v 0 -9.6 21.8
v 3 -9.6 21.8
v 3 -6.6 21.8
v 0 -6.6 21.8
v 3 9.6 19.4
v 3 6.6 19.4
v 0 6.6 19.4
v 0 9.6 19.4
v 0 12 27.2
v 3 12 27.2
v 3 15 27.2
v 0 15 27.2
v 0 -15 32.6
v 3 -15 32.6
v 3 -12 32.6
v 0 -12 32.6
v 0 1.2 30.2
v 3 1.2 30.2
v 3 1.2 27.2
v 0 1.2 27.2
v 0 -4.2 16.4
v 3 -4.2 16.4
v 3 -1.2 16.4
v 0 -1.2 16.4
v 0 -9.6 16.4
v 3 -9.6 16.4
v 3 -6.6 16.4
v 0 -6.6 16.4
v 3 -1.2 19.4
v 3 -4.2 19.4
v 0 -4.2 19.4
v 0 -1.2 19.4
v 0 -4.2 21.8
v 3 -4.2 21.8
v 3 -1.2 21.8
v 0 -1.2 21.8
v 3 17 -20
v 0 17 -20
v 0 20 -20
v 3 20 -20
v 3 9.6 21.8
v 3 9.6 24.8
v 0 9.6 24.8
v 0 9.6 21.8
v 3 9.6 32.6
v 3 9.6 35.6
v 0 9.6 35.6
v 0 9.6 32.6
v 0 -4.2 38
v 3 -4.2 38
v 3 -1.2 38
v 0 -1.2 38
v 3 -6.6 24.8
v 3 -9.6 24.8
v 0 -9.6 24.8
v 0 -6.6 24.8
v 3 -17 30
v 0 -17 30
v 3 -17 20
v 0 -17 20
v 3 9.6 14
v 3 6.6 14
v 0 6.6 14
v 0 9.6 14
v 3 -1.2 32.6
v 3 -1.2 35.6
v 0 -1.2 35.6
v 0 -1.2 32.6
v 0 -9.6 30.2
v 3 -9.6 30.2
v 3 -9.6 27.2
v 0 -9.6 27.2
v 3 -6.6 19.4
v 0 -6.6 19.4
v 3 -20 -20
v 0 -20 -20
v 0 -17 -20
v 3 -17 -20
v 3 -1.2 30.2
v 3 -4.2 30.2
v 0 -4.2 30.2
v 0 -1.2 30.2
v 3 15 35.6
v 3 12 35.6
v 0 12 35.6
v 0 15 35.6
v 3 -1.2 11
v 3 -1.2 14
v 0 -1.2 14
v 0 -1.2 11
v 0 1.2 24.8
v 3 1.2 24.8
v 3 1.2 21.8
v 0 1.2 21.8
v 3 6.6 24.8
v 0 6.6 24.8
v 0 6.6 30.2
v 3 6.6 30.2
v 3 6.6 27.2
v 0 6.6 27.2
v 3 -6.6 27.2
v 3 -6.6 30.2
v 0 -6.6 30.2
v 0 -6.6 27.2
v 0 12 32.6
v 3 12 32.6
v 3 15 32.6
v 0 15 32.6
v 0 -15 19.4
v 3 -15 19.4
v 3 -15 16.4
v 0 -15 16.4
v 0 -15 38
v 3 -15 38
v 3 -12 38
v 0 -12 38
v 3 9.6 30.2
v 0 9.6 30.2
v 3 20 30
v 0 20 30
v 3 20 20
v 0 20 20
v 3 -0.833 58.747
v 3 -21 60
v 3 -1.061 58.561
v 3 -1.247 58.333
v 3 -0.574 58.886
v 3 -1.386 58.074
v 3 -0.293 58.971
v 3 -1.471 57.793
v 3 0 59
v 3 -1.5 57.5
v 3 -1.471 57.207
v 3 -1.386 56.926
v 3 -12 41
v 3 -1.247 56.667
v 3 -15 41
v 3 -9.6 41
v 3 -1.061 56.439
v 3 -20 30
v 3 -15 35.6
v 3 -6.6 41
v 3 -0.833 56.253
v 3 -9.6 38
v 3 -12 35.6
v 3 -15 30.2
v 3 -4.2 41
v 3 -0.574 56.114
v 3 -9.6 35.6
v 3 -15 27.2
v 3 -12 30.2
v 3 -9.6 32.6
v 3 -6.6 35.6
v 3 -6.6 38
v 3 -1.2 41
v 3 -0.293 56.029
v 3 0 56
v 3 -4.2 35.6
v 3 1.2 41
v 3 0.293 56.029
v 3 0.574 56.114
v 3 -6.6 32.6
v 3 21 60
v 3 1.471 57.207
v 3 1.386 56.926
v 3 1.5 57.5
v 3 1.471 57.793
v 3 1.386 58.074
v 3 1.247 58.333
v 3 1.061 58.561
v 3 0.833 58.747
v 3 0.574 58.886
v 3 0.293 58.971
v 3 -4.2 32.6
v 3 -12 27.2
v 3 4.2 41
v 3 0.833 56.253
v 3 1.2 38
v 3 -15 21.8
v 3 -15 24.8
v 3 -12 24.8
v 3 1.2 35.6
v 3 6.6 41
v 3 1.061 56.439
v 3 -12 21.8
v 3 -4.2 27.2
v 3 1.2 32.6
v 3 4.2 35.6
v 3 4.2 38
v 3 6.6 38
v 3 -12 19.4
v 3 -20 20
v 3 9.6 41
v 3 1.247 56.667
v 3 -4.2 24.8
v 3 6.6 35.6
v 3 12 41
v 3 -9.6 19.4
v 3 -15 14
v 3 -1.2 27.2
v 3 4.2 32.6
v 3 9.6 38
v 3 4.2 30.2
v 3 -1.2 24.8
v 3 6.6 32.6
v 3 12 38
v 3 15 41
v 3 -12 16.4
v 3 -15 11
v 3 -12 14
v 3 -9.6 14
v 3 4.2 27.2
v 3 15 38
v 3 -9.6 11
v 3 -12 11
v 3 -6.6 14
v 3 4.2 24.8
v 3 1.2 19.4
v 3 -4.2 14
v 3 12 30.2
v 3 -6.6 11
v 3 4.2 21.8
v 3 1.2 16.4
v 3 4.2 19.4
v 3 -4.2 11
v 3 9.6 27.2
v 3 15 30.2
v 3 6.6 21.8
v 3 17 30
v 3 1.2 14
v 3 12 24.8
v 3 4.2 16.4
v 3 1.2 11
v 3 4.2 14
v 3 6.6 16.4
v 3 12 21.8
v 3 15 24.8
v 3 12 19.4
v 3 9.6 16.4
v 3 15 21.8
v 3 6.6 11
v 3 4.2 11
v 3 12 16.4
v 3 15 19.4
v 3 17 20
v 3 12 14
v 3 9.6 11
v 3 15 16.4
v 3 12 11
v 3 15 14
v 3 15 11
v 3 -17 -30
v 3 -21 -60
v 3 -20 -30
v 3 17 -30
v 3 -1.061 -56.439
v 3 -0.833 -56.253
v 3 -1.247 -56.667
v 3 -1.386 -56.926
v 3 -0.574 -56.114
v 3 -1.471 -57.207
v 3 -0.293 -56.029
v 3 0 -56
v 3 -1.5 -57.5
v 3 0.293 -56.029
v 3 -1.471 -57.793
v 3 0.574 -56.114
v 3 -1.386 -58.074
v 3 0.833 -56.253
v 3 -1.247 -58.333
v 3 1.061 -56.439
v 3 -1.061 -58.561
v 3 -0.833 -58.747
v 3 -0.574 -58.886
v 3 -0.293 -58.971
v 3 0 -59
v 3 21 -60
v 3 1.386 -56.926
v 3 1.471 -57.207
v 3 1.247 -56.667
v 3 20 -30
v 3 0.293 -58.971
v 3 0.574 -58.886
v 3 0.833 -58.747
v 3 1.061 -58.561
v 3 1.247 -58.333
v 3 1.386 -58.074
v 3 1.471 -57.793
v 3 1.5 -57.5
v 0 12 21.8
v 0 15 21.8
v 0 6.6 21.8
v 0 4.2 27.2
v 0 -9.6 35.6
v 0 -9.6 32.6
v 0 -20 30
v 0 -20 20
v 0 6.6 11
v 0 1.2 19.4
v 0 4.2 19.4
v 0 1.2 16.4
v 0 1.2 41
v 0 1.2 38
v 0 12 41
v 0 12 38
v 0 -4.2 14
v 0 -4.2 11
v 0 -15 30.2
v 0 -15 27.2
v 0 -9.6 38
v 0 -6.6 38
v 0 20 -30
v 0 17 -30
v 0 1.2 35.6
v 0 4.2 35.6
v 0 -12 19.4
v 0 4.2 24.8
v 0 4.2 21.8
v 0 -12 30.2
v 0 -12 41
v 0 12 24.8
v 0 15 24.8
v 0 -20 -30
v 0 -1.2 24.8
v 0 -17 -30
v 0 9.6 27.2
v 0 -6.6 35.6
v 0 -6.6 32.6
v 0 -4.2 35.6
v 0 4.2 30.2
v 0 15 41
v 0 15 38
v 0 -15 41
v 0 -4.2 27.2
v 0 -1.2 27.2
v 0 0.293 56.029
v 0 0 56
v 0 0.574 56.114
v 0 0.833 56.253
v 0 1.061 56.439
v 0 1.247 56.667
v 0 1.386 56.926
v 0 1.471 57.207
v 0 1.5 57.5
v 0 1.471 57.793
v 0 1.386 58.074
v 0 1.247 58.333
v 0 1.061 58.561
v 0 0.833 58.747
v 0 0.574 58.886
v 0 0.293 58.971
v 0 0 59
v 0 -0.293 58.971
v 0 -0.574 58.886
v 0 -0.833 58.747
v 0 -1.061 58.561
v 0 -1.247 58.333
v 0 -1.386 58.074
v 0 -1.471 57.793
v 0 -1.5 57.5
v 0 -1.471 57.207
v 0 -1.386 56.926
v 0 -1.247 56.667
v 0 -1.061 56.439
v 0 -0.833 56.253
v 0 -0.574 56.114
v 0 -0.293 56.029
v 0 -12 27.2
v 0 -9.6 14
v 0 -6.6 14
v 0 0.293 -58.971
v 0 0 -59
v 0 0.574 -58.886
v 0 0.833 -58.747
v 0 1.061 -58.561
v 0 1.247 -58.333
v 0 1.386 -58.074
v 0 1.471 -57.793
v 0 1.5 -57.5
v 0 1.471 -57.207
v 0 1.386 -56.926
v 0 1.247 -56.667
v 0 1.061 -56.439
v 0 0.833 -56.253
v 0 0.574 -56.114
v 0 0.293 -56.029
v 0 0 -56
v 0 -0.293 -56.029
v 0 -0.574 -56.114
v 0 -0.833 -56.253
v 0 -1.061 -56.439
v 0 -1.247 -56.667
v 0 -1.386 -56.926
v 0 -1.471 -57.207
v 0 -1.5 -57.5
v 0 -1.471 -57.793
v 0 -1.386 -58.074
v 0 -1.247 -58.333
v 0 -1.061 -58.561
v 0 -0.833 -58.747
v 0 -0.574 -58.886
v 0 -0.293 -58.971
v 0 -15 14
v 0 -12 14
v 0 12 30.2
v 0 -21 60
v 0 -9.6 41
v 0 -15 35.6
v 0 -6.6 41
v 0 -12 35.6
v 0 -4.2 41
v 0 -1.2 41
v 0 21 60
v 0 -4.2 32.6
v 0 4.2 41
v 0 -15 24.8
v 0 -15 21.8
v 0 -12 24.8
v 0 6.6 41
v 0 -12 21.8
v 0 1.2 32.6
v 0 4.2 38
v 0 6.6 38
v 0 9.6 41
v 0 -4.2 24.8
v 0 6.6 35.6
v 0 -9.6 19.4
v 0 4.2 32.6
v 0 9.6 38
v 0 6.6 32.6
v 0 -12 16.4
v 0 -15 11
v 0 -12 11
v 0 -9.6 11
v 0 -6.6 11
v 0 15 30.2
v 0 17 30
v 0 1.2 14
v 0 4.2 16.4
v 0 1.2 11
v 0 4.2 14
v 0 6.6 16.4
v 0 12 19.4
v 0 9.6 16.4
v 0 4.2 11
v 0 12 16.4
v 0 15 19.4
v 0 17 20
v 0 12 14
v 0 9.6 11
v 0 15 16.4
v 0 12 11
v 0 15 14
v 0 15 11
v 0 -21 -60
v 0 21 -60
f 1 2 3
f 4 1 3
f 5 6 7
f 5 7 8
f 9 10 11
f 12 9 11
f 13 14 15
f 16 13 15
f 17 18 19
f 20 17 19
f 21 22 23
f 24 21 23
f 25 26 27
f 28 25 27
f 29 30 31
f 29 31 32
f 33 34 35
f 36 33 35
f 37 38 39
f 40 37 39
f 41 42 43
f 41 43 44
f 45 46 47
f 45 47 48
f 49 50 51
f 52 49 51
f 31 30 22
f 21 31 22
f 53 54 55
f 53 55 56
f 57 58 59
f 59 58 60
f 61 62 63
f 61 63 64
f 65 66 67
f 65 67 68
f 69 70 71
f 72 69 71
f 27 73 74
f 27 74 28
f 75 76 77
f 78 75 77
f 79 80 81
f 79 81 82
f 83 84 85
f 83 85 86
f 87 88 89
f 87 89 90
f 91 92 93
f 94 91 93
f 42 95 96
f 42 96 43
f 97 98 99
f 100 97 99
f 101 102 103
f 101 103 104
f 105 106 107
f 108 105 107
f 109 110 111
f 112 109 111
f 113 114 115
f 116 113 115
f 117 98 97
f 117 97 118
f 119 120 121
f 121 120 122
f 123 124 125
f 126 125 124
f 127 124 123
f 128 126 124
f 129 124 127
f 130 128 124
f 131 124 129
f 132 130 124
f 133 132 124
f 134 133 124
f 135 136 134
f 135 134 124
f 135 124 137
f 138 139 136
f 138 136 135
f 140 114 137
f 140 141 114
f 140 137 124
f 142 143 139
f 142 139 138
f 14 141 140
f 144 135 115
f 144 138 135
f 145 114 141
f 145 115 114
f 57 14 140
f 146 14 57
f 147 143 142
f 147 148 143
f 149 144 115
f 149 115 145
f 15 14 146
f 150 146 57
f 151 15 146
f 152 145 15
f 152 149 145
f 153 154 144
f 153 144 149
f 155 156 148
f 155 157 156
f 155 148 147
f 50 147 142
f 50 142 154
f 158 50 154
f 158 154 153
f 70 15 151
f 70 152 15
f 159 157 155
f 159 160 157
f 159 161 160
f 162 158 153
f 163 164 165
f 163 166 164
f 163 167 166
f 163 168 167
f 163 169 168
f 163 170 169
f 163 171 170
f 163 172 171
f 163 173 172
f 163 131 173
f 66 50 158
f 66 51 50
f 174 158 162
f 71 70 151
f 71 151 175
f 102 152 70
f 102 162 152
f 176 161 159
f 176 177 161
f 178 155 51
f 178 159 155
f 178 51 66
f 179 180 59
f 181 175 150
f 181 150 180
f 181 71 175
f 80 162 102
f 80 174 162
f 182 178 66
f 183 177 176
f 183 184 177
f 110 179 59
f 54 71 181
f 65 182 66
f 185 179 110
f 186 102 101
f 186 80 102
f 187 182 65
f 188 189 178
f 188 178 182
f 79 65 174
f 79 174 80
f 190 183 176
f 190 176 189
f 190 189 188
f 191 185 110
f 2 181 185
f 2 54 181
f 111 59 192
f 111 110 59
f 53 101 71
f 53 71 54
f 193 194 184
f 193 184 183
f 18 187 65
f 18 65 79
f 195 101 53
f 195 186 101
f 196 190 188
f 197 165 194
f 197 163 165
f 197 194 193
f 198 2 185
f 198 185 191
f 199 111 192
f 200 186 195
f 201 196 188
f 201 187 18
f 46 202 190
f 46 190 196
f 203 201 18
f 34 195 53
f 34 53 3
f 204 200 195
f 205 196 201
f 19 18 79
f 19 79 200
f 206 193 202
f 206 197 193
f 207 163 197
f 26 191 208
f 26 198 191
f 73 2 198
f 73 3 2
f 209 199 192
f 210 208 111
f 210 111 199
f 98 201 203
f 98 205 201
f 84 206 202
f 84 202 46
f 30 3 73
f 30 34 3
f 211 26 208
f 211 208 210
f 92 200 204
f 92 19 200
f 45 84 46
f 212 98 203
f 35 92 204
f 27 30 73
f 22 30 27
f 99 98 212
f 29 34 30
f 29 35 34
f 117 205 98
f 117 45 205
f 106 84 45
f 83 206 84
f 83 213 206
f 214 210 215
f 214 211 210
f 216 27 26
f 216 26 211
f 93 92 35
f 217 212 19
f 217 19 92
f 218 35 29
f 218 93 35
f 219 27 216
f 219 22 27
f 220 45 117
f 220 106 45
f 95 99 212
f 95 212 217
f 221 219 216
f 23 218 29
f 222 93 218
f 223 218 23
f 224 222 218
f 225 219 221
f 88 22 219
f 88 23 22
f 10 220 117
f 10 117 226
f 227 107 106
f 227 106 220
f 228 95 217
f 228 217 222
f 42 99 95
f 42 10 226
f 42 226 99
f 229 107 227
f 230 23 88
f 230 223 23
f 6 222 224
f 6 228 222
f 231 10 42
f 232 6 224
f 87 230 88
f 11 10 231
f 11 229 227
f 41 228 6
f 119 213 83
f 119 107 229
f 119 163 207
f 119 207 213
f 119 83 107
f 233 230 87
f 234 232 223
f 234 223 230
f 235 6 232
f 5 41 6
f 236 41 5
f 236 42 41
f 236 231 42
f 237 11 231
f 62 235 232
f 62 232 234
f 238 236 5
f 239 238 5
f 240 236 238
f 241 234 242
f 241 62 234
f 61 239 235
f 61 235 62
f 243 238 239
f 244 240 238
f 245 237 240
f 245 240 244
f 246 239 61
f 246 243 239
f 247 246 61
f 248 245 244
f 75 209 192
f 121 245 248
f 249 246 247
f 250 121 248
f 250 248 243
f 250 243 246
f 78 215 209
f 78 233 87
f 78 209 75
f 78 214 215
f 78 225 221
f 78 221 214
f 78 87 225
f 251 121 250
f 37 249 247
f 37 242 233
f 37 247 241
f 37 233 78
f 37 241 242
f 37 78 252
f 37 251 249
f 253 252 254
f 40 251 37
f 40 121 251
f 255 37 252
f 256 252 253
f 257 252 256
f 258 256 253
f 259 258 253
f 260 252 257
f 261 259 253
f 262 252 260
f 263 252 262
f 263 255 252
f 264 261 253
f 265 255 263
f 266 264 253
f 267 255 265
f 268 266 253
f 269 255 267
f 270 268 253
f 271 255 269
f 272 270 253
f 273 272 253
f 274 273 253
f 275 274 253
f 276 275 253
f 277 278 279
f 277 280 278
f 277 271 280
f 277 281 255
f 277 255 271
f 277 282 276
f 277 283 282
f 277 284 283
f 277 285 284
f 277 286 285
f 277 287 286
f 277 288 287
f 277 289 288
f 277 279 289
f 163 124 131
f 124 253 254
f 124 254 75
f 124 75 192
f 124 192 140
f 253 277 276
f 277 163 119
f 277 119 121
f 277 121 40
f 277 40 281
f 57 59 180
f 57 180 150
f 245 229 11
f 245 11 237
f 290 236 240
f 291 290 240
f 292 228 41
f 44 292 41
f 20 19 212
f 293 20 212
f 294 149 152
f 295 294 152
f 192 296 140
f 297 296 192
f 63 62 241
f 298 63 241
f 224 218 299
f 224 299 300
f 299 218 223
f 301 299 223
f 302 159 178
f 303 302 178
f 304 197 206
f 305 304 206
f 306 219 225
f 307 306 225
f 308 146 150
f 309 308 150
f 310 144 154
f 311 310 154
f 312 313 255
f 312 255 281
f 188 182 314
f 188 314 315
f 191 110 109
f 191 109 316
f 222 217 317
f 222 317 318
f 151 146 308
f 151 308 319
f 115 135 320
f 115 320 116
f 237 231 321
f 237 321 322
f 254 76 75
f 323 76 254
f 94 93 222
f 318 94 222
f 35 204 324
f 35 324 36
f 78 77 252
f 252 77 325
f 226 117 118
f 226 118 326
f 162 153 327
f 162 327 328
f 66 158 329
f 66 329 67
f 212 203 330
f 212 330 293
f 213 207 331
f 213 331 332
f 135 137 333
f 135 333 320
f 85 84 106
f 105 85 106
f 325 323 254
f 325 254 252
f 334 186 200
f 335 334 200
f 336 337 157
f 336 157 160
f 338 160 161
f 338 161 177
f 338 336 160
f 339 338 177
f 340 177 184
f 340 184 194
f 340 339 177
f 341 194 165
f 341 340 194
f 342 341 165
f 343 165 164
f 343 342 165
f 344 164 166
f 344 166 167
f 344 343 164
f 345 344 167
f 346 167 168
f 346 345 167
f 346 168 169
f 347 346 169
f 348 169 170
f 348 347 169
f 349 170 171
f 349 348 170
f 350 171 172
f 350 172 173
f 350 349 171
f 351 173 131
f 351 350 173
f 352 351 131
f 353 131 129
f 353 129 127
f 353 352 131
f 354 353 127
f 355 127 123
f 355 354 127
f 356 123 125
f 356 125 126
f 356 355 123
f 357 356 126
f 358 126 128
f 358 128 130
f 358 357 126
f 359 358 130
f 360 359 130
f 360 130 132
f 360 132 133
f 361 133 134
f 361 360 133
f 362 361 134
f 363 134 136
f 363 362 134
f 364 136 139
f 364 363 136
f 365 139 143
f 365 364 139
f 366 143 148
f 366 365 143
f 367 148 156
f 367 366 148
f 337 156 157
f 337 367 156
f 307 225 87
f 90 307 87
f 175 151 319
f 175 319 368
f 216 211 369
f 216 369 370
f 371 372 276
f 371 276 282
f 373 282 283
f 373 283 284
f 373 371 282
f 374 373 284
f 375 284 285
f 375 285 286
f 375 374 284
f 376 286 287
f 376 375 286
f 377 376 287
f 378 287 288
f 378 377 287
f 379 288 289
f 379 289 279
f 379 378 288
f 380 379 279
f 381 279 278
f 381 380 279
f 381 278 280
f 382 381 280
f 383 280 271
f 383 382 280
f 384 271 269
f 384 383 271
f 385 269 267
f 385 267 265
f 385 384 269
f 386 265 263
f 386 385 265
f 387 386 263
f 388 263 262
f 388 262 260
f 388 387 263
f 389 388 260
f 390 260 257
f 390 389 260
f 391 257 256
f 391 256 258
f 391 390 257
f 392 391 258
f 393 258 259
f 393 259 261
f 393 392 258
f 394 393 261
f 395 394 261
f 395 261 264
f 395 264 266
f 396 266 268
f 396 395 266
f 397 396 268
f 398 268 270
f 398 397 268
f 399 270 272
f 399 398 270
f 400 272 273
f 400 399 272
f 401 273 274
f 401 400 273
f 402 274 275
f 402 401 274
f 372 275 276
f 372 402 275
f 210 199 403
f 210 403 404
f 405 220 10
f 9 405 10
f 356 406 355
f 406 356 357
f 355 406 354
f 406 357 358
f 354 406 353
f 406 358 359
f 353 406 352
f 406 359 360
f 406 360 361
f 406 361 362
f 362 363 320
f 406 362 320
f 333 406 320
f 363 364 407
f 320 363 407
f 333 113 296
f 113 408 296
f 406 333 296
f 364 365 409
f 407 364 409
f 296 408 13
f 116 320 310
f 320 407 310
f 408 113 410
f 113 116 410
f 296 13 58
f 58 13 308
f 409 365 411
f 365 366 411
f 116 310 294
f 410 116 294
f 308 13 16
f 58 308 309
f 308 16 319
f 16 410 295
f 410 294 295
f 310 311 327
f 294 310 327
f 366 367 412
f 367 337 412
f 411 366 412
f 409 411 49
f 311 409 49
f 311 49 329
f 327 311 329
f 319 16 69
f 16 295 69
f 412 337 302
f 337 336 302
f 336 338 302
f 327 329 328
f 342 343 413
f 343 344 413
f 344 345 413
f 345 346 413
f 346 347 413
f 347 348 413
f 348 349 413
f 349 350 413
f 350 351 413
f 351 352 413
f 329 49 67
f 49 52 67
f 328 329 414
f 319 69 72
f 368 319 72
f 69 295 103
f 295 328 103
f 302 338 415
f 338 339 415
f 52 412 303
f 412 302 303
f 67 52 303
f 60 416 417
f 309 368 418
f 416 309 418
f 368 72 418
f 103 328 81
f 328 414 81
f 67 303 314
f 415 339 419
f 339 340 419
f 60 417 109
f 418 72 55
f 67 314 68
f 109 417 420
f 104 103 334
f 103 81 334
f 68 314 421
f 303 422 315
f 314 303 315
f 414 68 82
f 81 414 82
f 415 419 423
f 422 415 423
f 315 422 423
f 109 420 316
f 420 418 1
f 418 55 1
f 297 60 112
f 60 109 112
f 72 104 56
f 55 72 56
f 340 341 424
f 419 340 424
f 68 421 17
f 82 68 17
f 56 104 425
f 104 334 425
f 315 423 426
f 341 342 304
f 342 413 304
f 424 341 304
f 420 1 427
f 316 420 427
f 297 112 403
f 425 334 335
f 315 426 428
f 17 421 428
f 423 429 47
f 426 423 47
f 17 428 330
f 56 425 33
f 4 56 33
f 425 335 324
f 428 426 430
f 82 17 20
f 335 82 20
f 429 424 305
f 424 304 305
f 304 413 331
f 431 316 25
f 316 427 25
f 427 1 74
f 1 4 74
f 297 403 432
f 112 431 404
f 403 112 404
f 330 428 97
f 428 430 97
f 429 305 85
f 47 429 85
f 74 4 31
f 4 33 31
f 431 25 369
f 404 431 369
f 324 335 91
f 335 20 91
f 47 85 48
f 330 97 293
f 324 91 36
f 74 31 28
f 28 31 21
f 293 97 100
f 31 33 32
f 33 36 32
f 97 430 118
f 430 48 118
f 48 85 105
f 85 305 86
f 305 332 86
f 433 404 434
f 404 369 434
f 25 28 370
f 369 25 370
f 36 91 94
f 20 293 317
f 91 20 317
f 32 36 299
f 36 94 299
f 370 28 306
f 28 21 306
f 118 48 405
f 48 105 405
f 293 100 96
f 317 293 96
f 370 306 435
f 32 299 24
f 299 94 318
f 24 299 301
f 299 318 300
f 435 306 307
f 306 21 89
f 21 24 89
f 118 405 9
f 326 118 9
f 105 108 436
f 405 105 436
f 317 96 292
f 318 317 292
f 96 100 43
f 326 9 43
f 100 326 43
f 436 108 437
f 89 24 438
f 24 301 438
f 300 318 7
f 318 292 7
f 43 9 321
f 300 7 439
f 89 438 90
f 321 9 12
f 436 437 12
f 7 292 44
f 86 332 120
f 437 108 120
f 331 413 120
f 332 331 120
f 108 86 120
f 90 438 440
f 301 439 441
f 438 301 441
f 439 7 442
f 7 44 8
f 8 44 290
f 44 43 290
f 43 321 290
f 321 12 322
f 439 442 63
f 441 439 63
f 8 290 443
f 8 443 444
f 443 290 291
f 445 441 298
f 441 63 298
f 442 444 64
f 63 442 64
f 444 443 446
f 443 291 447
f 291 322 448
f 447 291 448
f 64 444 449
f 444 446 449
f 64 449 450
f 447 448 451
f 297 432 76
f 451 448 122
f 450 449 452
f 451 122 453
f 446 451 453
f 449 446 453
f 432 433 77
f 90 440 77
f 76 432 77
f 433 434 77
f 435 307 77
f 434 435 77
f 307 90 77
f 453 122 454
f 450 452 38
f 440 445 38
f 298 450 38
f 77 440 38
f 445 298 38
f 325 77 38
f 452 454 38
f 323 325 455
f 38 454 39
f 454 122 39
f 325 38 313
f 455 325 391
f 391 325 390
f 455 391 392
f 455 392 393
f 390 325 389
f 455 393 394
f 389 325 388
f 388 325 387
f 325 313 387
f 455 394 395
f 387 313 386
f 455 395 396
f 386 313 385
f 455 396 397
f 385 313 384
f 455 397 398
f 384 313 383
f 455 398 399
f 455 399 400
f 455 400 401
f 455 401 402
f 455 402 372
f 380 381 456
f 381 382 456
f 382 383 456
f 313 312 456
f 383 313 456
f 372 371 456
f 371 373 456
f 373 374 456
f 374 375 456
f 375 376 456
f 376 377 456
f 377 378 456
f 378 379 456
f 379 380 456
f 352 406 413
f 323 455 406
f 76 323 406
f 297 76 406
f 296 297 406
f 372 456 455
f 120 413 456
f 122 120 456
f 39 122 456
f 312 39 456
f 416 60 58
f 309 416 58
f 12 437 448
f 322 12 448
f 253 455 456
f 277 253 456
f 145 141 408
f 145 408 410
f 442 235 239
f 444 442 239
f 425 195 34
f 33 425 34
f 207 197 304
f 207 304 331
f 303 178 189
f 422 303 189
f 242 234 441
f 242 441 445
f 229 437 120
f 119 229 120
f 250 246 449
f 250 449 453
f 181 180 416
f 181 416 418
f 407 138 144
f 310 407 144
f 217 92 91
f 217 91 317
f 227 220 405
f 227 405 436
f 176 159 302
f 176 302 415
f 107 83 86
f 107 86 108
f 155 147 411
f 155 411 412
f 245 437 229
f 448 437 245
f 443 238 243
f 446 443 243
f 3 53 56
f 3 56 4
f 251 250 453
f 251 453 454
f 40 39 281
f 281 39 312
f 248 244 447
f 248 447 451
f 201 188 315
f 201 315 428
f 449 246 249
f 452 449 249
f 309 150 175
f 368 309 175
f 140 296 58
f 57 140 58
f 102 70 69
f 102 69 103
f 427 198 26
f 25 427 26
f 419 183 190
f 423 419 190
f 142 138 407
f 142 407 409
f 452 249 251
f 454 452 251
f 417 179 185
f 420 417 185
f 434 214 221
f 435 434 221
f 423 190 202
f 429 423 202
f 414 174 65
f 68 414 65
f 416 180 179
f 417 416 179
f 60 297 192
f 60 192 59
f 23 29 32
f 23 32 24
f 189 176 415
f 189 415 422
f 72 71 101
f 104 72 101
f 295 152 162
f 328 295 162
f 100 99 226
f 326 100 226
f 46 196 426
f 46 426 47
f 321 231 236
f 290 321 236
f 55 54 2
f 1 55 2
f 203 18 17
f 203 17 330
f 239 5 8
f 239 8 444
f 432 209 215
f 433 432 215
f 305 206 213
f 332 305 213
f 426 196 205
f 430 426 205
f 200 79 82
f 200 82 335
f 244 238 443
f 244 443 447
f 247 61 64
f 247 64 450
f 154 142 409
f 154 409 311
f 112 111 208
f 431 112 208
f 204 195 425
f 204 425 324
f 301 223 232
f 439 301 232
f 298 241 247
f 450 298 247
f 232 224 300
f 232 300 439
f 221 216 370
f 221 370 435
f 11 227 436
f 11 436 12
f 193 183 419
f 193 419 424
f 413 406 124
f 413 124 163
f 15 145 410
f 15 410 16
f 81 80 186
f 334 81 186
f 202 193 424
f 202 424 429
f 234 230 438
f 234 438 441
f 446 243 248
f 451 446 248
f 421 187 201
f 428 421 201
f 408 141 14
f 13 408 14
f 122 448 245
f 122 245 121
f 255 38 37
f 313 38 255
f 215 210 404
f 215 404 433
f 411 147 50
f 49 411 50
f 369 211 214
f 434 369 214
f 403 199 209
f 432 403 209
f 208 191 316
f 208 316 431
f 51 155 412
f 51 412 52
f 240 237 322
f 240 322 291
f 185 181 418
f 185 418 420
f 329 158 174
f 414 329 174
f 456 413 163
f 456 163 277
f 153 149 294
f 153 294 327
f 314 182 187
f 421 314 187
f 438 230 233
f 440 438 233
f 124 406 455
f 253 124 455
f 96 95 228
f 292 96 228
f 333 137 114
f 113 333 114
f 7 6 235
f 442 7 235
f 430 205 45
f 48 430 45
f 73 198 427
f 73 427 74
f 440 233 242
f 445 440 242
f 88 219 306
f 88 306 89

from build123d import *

# Parameters (mm, degrees)
SKETCH1_W            = 120
SKETCH1_H            = 42
SKETCH1_R            = 1.5
SKETCH1_W_2          = 10
SKETCH1_H_2          = 3
BOSS_EXTRUDE1_DEPTH  = 3
SKETCH2_W            = 3
SKETCH2_H            = 3
CUT_EXTRUDE1_DEPTH   = 3
LPATTERN1_COUNT      = 6
LPATTERN1_PITCH      = 5.4
LPATTERN1_COUNT_DIR2 = 6
LPATTERN1_PITCH_DIR2 = 5.4


with BuildPart() as part:
    # Sketch1 → Boss-Extrude1 (new body)
    with BuildSketch(Plane(origin=(0, 0, 0), x_dir=(0, 0, -1), z_dir=(1, 0, 0))):
        Rectangle(SKETCH1_W, SKETCH1_H)
        with Locations((-57.5, 0)):
            Circle(SKETCH1_R, mode=Mode.SUBTRACT)
        with Locations((57.5, 0)):
            Circle(SKETCH1_R, mode=Mode.SUBTRACT)
        with Locations((25, 18.5)):
            Rectangle(SKETCH1_W_2, SKETCH1_H_2, mode=Mode.SUBTRACT)
        with Locations((-25, 18.5)):
            Rectangle(SKETCH1_W_2, SKETCH1_H_2, mode=Mode.SUBTRACT)
        with Locations((-25, -18.5)):
            Rectangle(SKETCH1_W_2, SKETCH1_H_2, mode=Mode.SUBTRACT)
        with Locations((25, -18.5)):
            Rectangle(SKETCH1_W_2, SKETCH1_H_2, mode=Mode.SUBTRACT)
    extrude(amount=BOSS_EXTRUDE1_DEPTH)

    # Sketch2 → Cut-Extrude1 (cut)
    with BuildSketch(Plane(origin=(3, 0, 0), x_dir=(0, 0, -1), z_dir=(1, 0, 0))):
        with Locations((-12.5, 13.5)):
            Rectangle(SKETCH2_W, SKETCH2_H)
    cut_extrude1 = extrude(amount=-CUT_EXTRUDE1_DEPTH, mode=Mode.SUBTRACT)

    # LPattern1: Cut-Extrude1 6 × 6
    with Locations(*[(0, -j * LPATTERN1_PITCH_DIR2, i * LPATTERN1_PITCH) for i in range(LPATTERN1_COUNT) for j in range(LPATTERN1_COUNT_DIR2) if (i, j) != (0, 0)]):
        add(cut_extrude1, mode=Mode.SUBTRACT)


solid = part.part
